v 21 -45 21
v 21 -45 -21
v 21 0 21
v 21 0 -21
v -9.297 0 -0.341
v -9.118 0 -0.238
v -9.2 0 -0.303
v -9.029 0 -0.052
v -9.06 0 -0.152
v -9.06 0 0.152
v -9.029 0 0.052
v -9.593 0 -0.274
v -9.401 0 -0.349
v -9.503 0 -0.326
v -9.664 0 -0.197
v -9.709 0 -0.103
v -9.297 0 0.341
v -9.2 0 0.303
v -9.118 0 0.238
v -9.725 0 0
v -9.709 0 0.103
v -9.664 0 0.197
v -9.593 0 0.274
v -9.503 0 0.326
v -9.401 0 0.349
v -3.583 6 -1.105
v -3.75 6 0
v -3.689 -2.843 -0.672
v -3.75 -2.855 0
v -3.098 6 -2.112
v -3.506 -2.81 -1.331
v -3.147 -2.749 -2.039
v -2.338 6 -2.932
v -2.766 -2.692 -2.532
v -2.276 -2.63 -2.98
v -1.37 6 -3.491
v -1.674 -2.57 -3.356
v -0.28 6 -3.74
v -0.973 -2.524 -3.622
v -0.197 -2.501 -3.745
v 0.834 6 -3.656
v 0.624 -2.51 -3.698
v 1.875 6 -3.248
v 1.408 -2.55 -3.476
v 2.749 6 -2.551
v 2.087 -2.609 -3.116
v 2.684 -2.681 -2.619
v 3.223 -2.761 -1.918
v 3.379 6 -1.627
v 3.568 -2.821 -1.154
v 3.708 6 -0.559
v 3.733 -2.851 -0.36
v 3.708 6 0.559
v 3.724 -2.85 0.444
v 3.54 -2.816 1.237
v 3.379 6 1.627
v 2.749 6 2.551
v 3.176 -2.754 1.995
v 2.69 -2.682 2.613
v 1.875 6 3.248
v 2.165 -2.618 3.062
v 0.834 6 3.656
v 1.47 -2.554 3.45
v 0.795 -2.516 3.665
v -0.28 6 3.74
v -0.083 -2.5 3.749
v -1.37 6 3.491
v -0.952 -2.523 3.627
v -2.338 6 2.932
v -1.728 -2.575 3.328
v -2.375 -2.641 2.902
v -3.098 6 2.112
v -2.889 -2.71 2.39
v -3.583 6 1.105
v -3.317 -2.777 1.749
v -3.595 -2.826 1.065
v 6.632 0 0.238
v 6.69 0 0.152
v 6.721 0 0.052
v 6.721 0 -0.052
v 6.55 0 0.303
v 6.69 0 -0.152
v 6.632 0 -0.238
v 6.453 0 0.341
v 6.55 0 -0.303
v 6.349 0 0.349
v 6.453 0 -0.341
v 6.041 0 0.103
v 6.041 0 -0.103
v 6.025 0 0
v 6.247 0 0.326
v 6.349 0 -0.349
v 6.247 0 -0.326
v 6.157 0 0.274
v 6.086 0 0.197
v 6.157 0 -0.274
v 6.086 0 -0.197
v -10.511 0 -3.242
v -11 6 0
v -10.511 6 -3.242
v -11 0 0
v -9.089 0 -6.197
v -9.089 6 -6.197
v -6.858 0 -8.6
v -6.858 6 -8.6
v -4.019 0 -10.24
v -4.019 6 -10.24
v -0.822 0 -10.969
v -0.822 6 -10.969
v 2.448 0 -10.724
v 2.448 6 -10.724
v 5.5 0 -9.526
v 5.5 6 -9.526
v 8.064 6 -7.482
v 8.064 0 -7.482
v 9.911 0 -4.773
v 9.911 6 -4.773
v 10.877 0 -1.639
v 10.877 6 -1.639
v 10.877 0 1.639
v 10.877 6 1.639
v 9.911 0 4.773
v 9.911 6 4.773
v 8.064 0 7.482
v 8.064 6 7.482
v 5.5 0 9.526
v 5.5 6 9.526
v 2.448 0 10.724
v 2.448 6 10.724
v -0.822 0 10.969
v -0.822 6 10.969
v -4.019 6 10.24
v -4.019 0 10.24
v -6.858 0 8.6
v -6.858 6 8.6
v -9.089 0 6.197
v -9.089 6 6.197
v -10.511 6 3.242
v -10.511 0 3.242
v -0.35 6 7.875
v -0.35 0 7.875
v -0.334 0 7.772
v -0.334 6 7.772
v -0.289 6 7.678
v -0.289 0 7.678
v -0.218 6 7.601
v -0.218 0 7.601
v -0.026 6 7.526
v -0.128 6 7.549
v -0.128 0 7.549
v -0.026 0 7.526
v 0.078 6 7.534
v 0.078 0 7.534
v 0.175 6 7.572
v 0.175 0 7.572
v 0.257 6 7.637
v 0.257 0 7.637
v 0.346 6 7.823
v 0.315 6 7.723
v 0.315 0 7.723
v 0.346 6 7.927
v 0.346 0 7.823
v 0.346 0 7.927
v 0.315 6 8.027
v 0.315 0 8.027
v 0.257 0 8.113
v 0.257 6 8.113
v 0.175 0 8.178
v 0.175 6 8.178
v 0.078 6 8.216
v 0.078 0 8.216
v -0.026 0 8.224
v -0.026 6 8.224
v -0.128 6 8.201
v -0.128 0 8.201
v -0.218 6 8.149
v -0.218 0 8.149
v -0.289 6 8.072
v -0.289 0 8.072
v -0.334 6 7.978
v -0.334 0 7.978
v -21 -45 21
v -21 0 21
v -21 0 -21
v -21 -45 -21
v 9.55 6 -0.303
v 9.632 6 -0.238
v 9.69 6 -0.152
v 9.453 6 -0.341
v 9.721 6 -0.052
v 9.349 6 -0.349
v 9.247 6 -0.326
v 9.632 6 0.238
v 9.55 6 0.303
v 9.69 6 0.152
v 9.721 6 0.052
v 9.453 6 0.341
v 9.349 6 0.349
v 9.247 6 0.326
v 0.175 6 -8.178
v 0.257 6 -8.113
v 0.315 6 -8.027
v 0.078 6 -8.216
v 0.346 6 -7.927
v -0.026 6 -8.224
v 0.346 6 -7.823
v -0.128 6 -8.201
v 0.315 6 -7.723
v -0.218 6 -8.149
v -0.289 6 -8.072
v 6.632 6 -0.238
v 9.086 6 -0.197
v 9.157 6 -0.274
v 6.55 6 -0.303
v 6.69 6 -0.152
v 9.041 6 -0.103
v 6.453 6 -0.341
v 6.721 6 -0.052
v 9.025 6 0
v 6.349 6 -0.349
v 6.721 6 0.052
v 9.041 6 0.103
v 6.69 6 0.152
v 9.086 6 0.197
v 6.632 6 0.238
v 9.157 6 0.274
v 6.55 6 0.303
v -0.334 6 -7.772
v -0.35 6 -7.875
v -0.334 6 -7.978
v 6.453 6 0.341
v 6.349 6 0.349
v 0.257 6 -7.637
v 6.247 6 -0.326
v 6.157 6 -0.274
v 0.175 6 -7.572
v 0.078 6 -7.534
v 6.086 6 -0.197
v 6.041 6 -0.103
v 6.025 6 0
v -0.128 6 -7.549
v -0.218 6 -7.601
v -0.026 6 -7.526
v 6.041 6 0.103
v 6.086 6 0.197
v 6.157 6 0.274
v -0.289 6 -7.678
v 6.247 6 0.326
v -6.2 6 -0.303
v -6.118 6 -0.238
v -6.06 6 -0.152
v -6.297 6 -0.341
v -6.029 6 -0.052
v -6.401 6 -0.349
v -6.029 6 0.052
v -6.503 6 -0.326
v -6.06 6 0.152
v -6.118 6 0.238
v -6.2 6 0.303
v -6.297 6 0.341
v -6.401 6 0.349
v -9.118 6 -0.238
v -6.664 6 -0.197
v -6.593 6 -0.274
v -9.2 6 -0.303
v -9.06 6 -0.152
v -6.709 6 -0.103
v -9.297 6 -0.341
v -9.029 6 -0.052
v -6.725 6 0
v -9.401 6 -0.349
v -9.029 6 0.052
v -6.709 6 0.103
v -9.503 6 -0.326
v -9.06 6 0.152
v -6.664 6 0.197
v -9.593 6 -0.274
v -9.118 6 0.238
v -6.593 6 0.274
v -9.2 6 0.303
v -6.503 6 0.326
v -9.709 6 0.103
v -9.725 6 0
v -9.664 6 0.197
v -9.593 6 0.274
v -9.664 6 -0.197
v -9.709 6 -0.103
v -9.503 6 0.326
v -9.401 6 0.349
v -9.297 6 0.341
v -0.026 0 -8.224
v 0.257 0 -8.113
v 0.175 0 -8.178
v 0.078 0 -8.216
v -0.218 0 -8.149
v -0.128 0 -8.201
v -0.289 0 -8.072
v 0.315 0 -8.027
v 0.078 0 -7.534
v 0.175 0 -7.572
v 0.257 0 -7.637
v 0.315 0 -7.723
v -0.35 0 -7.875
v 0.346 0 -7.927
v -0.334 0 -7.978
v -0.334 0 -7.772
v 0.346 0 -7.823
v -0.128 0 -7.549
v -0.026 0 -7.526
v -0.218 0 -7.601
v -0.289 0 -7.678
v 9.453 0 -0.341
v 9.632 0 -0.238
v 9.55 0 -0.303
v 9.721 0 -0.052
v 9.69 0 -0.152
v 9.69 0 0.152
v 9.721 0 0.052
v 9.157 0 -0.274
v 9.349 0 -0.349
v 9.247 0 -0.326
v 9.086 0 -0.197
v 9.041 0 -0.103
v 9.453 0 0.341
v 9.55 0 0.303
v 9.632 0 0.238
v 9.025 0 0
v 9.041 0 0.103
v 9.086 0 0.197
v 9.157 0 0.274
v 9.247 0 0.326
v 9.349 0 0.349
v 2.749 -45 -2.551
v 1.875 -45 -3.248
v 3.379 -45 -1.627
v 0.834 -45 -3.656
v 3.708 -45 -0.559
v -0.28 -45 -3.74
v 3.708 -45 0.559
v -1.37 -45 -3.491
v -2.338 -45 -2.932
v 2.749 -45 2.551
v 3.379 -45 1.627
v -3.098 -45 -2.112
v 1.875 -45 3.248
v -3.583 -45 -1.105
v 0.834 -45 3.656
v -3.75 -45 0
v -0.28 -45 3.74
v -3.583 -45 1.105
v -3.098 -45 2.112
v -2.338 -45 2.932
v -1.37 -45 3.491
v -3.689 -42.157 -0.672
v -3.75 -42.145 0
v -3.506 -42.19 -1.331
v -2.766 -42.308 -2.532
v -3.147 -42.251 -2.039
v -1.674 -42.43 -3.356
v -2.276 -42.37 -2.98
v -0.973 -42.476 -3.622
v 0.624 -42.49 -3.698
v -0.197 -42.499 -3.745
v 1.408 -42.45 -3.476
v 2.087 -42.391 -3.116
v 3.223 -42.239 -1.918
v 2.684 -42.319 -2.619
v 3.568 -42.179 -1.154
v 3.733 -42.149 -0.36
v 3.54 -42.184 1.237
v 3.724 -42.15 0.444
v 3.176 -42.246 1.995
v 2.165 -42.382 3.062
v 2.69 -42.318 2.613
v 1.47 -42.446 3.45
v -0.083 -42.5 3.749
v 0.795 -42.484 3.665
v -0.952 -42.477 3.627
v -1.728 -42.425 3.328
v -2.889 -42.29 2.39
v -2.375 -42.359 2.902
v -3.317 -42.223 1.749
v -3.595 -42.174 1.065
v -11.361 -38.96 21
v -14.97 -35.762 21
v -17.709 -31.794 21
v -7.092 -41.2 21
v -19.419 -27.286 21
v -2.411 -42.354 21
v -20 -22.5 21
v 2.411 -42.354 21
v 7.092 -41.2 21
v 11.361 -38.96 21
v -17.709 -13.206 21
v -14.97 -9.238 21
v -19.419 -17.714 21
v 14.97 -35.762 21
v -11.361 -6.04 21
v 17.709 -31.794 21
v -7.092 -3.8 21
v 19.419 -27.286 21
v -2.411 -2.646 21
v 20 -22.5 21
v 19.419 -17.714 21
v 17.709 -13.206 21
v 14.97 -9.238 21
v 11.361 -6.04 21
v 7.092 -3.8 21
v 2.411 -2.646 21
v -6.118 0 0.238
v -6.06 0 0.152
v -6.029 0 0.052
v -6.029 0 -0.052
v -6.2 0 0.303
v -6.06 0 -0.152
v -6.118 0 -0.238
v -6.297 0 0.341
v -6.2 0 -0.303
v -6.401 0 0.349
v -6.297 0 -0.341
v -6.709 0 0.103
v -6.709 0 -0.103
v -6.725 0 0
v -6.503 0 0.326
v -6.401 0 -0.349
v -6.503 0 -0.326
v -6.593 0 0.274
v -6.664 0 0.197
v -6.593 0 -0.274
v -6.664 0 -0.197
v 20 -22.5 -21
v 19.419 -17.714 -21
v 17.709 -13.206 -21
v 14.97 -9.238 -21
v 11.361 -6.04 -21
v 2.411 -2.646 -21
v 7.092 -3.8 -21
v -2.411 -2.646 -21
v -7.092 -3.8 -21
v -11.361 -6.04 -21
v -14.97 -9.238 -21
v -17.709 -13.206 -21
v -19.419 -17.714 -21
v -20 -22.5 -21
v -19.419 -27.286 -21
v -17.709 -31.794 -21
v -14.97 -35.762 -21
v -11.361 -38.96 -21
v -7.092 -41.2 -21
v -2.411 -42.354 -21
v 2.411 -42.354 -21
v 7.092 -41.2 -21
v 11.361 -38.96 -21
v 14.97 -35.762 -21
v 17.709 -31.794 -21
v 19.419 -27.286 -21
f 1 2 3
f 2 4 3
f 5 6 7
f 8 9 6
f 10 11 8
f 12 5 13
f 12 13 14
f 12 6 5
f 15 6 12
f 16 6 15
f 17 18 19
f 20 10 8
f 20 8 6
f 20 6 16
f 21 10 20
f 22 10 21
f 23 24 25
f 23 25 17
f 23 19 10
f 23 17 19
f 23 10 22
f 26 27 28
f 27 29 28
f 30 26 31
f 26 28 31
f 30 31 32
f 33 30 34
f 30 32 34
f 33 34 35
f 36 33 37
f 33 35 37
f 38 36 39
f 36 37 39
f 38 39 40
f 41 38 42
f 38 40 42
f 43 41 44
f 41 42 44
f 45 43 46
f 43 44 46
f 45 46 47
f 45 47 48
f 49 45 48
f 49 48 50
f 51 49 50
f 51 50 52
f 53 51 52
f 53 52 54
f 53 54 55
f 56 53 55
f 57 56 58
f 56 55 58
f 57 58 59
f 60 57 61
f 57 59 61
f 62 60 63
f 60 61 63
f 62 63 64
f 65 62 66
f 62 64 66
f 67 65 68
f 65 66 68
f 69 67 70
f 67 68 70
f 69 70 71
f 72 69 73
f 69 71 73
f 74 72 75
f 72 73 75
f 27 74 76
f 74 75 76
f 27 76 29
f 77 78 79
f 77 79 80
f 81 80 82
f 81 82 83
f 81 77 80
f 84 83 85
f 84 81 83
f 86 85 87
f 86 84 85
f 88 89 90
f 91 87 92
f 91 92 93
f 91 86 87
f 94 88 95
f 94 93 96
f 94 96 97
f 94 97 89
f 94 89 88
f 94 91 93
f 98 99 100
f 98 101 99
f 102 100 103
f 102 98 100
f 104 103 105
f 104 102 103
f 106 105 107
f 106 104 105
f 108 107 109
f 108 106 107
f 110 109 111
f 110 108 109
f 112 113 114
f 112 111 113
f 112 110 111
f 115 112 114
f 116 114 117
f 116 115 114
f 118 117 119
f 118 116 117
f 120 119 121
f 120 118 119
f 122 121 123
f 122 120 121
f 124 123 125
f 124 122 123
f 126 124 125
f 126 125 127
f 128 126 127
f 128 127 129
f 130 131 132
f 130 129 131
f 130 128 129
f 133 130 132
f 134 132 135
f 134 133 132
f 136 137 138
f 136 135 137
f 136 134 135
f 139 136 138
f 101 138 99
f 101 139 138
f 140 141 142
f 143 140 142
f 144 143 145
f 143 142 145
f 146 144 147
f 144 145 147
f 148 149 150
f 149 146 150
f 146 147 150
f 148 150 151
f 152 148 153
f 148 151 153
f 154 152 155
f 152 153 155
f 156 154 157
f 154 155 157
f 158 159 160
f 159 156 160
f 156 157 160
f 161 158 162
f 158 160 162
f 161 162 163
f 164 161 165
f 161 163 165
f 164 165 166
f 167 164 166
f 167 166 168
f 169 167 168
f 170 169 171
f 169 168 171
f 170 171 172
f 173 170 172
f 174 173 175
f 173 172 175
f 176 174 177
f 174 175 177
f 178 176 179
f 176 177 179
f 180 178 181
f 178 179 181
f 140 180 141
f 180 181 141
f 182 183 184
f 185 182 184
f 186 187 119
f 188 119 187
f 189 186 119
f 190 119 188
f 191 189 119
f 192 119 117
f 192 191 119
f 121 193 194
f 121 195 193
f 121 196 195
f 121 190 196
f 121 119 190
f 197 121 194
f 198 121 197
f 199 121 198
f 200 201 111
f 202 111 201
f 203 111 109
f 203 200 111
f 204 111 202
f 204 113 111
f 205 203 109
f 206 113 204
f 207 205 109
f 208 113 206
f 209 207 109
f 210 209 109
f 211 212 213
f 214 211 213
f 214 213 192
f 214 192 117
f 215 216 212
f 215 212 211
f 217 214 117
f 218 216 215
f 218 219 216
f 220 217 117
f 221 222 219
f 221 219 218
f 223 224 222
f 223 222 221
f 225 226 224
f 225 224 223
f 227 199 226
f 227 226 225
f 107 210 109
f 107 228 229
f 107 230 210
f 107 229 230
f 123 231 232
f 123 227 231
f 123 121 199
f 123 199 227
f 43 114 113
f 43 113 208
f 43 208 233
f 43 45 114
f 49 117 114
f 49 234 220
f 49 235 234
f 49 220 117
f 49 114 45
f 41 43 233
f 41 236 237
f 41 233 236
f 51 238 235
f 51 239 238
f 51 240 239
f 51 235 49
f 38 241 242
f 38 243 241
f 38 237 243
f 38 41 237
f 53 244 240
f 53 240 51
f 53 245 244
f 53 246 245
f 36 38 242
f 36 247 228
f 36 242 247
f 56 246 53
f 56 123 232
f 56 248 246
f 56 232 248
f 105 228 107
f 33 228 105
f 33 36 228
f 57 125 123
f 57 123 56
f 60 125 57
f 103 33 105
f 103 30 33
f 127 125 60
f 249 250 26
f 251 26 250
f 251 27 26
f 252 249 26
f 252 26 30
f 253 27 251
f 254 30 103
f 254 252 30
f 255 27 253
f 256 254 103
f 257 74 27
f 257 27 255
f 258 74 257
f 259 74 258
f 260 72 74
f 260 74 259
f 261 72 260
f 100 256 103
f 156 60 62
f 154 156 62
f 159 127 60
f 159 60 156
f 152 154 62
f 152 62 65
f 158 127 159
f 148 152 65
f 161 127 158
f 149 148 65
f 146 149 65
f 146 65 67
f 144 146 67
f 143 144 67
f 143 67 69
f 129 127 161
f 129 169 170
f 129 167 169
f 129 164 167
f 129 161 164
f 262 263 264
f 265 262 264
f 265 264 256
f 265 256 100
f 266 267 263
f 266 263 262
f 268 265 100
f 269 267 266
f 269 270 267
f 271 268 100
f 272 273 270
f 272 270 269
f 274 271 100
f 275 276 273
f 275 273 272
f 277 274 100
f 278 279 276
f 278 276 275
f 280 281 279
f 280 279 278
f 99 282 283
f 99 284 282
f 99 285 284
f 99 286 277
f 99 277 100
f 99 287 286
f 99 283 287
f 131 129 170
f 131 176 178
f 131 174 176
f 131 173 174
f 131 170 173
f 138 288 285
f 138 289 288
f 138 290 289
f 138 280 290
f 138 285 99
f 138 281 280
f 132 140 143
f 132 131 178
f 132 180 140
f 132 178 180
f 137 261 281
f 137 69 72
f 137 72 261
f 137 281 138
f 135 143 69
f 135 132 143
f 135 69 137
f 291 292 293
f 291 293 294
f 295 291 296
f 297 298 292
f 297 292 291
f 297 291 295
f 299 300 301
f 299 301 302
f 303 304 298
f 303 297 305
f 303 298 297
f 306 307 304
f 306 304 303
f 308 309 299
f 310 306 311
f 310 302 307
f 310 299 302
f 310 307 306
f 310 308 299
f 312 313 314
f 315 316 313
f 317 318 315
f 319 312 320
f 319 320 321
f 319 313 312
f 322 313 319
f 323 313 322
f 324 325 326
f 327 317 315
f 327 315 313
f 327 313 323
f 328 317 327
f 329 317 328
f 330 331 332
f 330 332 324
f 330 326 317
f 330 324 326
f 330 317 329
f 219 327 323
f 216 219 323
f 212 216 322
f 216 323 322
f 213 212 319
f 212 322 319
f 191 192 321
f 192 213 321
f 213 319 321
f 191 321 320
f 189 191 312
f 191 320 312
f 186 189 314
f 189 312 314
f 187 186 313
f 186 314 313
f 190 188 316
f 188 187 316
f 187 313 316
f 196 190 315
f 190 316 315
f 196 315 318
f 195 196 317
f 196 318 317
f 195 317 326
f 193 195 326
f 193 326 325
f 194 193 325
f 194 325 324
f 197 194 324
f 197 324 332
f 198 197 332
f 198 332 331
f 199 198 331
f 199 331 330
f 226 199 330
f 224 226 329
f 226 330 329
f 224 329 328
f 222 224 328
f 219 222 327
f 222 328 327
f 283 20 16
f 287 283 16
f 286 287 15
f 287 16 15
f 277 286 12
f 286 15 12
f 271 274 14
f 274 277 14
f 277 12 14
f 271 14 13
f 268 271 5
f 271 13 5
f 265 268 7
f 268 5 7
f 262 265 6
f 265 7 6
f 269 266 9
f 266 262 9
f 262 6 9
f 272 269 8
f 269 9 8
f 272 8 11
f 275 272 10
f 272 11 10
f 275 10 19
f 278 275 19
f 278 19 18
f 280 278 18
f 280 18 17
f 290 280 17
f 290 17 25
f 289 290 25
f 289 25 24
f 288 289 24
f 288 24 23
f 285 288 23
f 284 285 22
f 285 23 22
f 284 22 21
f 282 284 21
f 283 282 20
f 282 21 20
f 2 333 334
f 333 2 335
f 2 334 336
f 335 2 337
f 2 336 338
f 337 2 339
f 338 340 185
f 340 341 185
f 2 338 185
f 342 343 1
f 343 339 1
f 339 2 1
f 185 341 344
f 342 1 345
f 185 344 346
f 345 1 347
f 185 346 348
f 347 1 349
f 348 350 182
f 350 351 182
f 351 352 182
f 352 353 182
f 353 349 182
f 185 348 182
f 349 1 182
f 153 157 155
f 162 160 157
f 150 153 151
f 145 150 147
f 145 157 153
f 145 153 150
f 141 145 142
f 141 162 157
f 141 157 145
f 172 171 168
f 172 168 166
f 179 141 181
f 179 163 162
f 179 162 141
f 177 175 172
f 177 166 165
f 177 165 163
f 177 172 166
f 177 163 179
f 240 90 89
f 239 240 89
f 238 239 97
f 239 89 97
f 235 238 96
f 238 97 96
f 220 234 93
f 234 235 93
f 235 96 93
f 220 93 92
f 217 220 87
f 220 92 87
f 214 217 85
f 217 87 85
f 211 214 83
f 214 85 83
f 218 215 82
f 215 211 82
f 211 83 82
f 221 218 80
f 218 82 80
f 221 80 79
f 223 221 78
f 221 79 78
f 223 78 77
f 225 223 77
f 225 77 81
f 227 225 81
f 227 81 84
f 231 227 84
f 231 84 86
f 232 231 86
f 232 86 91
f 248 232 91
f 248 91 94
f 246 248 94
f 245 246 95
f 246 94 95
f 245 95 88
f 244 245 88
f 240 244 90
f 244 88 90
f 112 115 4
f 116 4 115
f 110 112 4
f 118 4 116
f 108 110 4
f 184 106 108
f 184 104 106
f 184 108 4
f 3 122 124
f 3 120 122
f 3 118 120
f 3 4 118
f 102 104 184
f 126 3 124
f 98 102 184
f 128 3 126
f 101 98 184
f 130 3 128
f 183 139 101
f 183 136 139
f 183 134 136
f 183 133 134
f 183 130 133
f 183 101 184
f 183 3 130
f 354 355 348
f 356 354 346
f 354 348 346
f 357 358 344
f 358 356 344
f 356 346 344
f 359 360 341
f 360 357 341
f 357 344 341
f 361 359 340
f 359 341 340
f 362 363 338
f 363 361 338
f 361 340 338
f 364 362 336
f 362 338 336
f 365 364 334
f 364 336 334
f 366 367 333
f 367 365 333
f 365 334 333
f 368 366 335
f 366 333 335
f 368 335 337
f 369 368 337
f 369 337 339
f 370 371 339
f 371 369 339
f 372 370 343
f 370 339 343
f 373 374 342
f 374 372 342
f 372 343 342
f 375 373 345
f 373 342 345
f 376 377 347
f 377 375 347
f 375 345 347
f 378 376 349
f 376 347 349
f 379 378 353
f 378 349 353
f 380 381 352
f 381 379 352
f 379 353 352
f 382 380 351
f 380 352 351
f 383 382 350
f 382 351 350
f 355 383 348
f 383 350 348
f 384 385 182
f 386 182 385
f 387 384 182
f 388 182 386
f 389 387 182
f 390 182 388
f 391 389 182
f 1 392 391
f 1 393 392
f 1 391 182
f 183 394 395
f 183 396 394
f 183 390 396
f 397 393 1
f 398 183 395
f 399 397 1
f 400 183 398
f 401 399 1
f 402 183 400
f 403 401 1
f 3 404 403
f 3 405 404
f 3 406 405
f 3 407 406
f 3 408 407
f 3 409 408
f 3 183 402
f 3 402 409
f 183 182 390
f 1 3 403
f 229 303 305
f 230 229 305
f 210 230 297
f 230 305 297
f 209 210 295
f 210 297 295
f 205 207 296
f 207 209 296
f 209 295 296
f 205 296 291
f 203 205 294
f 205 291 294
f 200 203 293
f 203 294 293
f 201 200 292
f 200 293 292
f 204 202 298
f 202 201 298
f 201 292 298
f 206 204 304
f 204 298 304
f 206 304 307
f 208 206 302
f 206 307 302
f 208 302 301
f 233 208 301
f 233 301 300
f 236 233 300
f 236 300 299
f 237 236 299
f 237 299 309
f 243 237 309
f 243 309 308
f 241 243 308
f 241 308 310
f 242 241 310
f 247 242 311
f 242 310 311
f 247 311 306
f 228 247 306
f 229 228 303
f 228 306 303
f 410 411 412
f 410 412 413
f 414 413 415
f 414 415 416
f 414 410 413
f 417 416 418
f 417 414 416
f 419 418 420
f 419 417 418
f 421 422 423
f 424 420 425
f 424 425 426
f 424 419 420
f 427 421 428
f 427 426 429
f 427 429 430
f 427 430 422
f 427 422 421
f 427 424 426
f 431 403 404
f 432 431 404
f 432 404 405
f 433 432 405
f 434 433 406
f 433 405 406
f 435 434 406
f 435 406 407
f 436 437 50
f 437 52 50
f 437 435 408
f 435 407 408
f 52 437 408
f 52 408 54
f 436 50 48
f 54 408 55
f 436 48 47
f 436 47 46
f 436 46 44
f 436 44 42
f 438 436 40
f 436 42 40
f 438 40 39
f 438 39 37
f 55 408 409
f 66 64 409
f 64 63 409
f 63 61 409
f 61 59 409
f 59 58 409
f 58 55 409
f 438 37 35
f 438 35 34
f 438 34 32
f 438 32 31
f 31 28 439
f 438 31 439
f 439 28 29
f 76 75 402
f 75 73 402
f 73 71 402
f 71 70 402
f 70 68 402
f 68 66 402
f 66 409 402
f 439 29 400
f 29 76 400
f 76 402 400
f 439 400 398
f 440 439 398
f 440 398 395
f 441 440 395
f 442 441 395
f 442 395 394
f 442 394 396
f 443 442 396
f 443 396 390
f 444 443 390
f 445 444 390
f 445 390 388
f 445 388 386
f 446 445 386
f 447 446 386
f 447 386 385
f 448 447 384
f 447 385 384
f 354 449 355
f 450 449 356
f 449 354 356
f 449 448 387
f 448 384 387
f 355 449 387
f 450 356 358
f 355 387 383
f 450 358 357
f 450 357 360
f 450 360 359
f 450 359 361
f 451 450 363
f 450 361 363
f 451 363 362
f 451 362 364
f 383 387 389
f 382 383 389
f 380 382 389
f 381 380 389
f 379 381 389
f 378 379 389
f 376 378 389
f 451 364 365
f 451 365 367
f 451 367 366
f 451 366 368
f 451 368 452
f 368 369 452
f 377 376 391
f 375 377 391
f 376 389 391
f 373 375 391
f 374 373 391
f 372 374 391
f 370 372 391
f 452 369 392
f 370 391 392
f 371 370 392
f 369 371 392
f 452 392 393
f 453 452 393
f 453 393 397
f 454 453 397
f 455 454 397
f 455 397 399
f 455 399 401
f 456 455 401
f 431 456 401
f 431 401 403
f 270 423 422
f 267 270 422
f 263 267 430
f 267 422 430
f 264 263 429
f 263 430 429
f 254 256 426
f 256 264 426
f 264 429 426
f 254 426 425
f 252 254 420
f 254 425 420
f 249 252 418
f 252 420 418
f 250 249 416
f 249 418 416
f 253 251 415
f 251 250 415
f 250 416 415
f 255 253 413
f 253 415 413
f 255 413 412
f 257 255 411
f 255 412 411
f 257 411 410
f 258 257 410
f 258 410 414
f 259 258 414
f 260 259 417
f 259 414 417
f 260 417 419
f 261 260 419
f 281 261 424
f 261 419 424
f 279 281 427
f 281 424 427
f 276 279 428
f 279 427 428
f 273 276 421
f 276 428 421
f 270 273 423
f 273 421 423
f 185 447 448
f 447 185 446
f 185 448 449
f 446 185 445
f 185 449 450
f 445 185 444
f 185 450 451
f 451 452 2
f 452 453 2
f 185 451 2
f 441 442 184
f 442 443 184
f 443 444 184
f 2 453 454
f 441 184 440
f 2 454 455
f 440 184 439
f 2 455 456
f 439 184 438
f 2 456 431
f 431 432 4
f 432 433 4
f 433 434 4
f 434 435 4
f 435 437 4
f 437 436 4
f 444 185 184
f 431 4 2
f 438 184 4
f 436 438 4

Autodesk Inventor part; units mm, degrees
ref_plane "YZ Plane" through (0, 0, 0) normal (1, 0, 0) x (0, 1, 0)
ref_plane "XZ Plane" through (0, 0, 0) normal (0, 1, 0) x (-1, 0, 0)
ref_plane "XY Plane" through (0, 0, 0) normal (0, 0, 1) x (1, 0, 0)
sketch "Sketch1" plane through (0, 0, 0) normal (0, 1, 0) x (-1, 0, 0)
  circle A0 centre (0, 0) radius 11
  circle A1 centre (0, 0) radius 3
  circle A2 centre (0, 0) radius 3.75
  circle A3 centre (0, 0) radius 6.375 construction
  circle A4 centre (0, 0) radius 9.375 construction
  circle A5 centre (0, 0) radius 7.875 construction
  circle A6 centre (0, -7.875) radius 0.35
  circle A7 centre (6.375, 0) radius 0.35
  circle A8 centre (9.375, 0) radius 0.35
  line L0 (16.292, 0) -> (-19, 0) construction
  line L1 (0, 21) -> (0, -27.3544) construction
  circle A9 centre (0, 7.875) radius 0.35
  circle A10 centre (-6.375, 0) radius 0.35
  circle A11 centre (-9.375, 0) radius 0.35
  line L2 (0, -21) -> (21, -21)
  line L3 (21, -21) -> (21, 0)
  line L4 (0, 21) -> (21, 21)
  line L5 (21, 21) -> (21, 0)
  line L6 (0, -21) -> (-21, -21)
  line L7 (-21, -21) -> (-21, 0)
  line L8 (-21, 21) -> (-21, 0)
  line L9 (0, 21) -> (-21, 21)
  dimension "d6" = 12.75
  dimension "d7" = 18.75
  dimension "d8" = 15.75
  dimension "d2" = 7.5
  dimension "d4" = 22
  dimension "d5" = 6
  dimension "d9" = 0.7
  dimension "d13" = 0.7
  dimension "d14" = 0.7
  dimension "d17" = 21
  dimension "d18" = 21
extrude "Extrusion1" add sketch "Sketch1" against normal blind 45 contours A0 | A6 | A7 | A8 | A9 | A10 | A11 | L6 L7 L8 L9 L4 L5 L3 L2
extrude "Extrusion2" add sketch "Sketch1" along normal blind 6 contours A0
sketch "Sketch2" plane through (-21, 0, 21) normal (0, 0, 1) x (1, 0, 0)
  line L0 (42, 0) -> (0, 0) construction
  line L1 (42, 0) -> (42, -45) construction
  line L2 (42, -45) -> (0, -45) construction
  line L3 (0, 0) -> (0, -45) construction
  line L4 (42, -45) -> (0, -45) construction
  line L5 (0, 0) -> (0, -45) construction
  line L6 (42, 0) -> (0, -45) construction
  line L7 (42, -45) -> (0, 0) construction
  circle A0 centre (21, -22.5) radius 20
  point P0 (21, 0)
  dimension "d23" = 40
extrude "Extrusion3" cut sketch "Sketch2" against normal blind 45
equation "\"d13\" = d9"
equation "\"d14\" = d9"
equation "\"d18\" = d17"
properties part number "engine_connector_sleeve"
